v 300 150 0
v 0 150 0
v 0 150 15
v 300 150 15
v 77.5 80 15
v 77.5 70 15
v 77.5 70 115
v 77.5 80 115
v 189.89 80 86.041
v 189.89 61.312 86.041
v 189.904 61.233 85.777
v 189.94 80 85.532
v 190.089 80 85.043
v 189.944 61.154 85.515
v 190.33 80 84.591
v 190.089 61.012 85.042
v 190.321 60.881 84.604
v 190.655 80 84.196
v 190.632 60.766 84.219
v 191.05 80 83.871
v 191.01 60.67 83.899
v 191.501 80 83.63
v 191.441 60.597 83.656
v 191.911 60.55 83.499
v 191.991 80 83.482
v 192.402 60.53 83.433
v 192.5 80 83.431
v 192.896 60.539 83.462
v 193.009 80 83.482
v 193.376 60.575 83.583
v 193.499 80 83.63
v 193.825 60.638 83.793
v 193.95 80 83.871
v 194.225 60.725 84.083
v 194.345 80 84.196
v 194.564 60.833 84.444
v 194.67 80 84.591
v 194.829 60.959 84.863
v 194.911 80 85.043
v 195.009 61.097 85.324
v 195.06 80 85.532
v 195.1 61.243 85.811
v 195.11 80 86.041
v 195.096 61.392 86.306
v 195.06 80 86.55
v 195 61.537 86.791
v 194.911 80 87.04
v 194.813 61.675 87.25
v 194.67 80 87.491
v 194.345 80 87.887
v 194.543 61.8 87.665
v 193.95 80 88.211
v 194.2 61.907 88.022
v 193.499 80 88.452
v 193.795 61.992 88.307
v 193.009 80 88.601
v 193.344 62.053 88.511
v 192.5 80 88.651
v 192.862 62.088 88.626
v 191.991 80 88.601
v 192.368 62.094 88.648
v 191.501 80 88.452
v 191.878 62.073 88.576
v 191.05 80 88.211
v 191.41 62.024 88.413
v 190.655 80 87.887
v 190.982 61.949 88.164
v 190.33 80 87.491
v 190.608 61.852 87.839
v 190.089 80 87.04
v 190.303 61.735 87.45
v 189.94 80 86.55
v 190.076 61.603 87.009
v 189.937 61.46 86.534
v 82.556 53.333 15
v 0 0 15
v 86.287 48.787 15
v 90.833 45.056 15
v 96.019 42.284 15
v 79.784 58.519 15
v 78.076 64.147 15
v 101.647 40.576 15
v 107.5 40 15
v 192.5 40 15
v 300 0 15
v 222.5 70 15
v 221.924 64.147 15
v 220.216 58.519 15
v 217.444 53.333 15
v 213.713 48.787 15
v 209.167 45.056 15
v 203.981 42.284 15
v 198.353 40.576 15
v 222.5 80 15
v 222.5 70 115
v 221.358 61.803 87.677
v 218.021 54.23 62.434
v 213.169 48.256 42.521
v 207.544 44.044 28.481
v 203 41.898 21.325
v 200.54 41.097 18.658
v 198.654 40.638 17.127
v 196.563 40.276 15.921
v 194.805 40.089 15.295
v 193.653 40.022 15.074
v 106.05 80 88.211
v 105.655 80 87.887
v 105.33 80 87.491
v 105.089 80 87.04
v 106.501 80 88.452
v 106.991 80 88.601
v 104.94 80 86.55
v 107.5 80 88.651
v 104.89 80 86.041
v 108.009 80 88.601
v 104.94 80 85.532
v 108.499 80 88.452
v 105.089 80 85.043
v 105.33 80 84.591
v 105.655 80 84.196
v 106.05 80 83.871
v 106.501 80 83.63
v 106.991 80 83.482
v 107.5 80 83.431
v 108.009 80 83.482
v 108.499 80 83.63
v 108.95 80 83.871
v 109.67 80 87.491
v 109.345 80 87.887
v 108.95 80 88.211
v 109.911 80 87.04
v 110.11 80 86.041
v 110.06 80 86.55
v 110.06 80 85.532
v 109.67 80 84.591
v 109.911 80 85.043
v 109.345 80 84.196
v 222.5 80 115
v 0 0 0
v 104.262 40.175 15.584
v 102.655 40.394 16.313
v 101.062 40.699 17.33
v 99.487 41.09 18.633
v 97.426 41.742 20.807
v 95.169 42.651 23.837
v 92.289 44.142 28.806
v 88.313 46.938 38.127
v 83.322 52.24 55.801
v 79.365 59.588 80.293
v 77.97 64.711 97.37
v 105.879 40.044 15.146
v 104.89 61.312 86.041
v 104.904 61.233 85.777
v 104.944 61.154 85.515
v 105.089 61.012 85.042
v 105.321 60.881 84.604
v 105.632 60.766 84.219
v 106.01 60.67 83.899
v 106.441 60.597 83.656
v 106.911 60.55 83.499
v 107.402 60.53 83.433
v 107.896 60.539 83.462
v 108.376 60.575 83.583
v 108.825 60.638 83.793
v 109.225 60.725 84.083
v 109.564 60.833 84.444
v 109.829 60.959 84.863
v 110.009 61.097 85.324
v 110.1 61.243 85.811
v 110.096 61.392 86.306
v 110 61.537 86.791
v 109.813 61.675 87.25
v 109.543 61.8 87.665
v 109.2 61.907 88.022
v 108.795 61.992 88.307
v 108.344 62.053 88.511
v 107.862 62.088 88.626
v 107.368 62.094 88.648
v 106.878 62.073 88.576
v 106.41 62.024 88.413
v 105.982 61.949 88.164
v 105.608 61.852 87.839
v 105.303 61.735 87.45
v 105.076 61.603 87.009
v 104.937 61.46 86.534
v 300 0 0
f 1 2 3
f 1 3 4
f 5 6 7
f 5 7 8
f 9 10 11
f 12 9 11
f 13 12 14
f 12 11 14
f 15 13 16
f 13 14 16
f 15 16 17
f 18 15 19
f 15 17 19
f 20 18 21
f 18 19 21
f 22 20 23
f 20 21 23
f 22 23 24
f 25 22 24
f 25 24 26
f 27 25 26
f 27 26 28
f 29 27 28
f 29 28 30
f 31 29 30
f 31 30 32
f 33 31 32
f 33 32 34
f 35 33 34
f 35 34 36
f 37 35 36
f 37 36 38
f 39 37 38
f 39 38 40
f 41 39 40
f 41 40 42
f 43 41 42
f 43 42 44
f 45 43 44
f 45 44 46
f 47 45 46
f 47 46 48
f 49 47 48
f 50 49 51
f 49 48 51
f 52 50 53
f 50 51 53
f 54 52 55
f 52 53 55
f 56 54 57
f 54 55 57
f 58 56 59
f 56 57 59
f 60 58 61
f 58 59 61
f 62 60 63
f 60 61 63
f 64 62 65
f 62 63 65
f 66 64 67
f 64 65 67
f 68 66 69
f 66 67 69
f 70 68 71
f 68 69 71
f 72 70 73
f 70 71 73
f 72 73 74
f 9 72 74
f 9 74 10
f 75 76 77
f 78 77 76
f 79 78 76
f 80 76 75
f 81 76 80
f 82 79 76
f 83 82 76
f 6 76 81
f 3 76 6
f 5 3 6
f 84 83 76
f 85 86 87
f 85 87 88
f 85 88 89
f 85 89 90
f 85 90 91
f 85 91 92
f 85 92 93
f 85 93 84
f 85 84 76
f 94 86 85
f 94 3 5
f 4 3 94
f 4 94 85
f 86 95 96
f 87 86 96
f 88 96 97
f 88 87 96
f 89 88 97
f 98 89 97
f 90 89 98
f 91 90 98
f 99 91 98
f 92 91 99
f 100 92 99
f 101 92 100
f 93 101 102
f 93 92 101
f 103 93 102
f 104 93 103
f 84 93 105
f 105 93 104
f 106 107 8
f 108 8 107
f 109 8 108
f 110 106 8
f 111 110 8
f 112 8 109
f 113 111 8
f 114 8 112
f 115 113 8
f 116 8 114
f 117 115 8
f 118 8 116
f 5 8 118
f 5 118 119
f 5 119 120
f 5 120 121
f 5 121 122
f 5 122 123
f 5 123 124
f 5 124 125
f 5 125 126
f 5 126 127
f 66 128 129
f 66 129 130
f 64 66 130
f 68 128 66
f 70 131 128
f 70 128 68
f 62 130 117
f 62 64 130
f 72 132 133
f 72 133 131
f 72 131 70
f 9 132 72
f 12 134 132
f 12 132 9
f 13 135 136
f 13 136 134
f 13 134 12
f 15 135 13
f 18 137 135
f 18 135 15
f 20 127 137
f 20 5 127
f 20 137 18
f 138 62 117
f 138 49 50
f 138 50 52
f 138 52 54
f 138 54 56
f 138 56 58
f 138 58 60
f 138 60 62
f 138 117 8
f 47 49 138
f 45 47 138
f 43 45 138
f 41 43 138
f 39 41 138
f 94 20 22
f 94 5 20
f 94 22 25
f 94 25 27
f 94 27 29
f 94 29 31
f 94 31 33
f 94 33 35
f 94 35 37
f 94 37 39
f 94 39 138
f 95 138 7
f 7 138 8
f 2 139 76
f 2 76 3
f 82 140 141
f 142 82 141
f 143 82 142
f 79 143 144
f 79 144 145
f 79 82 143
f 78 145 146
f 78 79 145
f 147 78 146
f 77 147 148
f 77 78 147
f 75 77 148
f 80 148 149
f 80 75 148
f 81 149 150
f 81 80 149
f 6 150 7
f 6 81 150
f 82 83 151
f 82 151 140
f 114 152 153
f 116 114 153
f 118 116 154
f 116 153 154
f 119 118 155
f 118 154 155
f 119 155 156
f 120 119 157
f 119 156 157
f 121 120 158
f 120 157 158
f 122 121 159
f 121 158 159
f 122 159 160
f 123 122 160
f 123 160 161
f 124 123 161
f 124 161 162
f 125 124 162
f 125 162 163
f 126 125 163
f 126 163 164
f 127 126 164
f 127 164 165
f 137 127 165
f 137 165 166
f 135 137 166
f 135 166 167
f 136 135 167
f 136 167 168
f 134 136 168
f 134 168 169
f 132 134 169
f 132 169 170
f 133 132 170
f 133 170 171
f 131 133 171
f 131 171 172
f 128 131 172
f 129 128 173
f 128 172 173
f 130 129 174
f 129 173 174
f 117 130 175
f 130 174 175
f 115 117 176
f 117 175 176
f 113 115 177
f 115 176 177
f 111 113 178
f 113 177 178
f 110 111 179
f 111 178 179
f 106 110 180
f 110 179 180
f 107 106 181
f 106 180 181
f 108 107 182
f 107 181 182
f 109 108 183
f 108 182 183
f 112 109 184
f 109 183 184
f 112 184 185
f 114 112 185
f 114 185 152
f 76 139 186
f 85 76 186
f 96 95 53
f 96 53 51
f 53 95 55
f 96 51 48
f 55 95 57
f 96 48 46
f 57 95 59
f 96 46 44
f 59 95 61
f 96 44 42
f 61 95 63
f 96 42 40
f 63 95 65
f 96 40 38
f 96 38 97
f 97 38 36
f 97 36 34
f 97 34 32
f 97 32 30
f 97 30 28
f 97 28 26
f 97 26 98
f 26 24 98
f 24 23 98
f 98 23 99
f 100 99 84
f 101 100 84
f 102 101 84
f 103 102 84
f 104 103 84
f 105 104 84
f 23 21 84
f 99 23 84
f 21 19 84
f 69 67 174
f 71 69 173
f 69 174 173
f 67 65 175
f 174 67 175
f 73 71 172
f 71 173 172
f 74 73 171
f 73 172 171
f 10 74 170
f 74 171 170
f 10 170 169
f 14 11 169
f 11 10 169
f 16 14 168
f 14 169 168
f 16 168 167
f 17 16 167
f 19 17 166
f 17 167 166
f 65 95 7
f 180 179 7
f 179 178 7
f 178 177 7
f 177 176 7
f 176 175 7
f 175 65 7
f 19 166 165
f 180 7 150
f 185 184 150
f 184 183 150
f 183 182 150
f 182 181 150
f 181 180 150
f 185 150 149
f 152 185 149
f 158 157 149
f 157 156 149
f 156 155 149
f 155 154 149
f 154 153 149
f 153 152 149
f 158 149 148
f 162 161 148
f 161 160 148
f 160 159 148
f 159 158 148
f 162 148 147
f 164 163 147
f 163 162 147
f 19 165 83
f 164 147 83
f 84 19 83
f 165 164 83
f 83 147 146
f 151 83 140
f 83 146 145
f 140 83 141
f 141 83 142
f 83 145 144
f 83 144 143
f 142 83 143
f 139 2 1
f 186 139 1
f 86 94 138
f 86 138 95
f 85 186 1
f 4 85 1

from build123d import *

# Parameters (mm, degrees)
SKETCH1_W                       = 300
SKETCH1_H                       = 150
BOSS_EXTRUDE1_DEPTH             = 15
BOSS_EXTRUDE2_DEPTH             = 100
CUT_EXTRUDE1_DEPTH              = 301
F_5_0_2055_DIAMETER_HOLE1_D     = 5.2197
F_5_0_2055_DIAMETER_HOLE1_DEPTH = 25
F_5_0_2055_DIAMETER_HOLE1_TIP   = 1.568156087


with BuildPart() as part:
    # Sketch1 → Boss-Extrude1 (new body)
    with BuildSketch(Plane.XY):
        with Locations((150, 75)):
            Rectangle(SKETCH1_W, SKETCH1_H)
    extrude(amount=BOSS_EXTRUDE1_DEPTH)

    # Sketch2 → Boss-Extrude2 (add)
    with BuildSketch(Plane.XY.offset(15)):
        with BuildLine():
            Line((77.5, 80), (222.5, 80))
            Line((222.5, 80), (222.5, 70))
            ThreePointArc((222.5, 70), (213.713203436, 48.786796564), (192.5, 40))
            Line((192.5, 40), (107.5, 40))
            ThreePointArc((107.5, 40), (86.286796564, 48.786796564), (77.5, 70))
            Line((77.5, 70), (77.5, 80))
        make_face()
    extrude(amount=BOSS_EXTRUDE2_DEPTH)

    # Sketch3 → Cut-Extrude1 (cut, through all)
    with BuildSketch(Plane(origin=(0, 0, 0), x_dir=(0, 0, -1), z_dir=(1, 0, 0))):
        Polygon((-115, 70), (-15, 40), (-115, 40), align=None)
    extrude(amount=CUT_EXTRUDE1_DEPTH, mode=Mode.SUBTRACT)

    # #5 (0.2055) Diameter Hole1
    with Locations(Plane(origin=(0, 80, 0), x_dir=(1, 0, 0), z_dir=(0, 1, 0))):
        with Locations((107.5, -86.041301647), (192.5, -86.041301647)):
            Hole(F_5_0_2055_DIAMETER_HOLE1_D / 2, depth=F_5_0_2055_DIAMETER_HOLE1_DEPTH)
            with Locations((0, 0, -(F_5_0_2055_DIAMETER_HOLE1_DEPTH + F_5_0_2055_DIAMETER_HOLE1_TIP / 2))):  # 118° drill point
                Cone(0, F_5_0_2055_DIAMETER_HOLE1_D / 2, F_5_0_2055_DIAMETER_HOLE1_TIP, mode=Mode.SUBTRACT)


solid = part.part
